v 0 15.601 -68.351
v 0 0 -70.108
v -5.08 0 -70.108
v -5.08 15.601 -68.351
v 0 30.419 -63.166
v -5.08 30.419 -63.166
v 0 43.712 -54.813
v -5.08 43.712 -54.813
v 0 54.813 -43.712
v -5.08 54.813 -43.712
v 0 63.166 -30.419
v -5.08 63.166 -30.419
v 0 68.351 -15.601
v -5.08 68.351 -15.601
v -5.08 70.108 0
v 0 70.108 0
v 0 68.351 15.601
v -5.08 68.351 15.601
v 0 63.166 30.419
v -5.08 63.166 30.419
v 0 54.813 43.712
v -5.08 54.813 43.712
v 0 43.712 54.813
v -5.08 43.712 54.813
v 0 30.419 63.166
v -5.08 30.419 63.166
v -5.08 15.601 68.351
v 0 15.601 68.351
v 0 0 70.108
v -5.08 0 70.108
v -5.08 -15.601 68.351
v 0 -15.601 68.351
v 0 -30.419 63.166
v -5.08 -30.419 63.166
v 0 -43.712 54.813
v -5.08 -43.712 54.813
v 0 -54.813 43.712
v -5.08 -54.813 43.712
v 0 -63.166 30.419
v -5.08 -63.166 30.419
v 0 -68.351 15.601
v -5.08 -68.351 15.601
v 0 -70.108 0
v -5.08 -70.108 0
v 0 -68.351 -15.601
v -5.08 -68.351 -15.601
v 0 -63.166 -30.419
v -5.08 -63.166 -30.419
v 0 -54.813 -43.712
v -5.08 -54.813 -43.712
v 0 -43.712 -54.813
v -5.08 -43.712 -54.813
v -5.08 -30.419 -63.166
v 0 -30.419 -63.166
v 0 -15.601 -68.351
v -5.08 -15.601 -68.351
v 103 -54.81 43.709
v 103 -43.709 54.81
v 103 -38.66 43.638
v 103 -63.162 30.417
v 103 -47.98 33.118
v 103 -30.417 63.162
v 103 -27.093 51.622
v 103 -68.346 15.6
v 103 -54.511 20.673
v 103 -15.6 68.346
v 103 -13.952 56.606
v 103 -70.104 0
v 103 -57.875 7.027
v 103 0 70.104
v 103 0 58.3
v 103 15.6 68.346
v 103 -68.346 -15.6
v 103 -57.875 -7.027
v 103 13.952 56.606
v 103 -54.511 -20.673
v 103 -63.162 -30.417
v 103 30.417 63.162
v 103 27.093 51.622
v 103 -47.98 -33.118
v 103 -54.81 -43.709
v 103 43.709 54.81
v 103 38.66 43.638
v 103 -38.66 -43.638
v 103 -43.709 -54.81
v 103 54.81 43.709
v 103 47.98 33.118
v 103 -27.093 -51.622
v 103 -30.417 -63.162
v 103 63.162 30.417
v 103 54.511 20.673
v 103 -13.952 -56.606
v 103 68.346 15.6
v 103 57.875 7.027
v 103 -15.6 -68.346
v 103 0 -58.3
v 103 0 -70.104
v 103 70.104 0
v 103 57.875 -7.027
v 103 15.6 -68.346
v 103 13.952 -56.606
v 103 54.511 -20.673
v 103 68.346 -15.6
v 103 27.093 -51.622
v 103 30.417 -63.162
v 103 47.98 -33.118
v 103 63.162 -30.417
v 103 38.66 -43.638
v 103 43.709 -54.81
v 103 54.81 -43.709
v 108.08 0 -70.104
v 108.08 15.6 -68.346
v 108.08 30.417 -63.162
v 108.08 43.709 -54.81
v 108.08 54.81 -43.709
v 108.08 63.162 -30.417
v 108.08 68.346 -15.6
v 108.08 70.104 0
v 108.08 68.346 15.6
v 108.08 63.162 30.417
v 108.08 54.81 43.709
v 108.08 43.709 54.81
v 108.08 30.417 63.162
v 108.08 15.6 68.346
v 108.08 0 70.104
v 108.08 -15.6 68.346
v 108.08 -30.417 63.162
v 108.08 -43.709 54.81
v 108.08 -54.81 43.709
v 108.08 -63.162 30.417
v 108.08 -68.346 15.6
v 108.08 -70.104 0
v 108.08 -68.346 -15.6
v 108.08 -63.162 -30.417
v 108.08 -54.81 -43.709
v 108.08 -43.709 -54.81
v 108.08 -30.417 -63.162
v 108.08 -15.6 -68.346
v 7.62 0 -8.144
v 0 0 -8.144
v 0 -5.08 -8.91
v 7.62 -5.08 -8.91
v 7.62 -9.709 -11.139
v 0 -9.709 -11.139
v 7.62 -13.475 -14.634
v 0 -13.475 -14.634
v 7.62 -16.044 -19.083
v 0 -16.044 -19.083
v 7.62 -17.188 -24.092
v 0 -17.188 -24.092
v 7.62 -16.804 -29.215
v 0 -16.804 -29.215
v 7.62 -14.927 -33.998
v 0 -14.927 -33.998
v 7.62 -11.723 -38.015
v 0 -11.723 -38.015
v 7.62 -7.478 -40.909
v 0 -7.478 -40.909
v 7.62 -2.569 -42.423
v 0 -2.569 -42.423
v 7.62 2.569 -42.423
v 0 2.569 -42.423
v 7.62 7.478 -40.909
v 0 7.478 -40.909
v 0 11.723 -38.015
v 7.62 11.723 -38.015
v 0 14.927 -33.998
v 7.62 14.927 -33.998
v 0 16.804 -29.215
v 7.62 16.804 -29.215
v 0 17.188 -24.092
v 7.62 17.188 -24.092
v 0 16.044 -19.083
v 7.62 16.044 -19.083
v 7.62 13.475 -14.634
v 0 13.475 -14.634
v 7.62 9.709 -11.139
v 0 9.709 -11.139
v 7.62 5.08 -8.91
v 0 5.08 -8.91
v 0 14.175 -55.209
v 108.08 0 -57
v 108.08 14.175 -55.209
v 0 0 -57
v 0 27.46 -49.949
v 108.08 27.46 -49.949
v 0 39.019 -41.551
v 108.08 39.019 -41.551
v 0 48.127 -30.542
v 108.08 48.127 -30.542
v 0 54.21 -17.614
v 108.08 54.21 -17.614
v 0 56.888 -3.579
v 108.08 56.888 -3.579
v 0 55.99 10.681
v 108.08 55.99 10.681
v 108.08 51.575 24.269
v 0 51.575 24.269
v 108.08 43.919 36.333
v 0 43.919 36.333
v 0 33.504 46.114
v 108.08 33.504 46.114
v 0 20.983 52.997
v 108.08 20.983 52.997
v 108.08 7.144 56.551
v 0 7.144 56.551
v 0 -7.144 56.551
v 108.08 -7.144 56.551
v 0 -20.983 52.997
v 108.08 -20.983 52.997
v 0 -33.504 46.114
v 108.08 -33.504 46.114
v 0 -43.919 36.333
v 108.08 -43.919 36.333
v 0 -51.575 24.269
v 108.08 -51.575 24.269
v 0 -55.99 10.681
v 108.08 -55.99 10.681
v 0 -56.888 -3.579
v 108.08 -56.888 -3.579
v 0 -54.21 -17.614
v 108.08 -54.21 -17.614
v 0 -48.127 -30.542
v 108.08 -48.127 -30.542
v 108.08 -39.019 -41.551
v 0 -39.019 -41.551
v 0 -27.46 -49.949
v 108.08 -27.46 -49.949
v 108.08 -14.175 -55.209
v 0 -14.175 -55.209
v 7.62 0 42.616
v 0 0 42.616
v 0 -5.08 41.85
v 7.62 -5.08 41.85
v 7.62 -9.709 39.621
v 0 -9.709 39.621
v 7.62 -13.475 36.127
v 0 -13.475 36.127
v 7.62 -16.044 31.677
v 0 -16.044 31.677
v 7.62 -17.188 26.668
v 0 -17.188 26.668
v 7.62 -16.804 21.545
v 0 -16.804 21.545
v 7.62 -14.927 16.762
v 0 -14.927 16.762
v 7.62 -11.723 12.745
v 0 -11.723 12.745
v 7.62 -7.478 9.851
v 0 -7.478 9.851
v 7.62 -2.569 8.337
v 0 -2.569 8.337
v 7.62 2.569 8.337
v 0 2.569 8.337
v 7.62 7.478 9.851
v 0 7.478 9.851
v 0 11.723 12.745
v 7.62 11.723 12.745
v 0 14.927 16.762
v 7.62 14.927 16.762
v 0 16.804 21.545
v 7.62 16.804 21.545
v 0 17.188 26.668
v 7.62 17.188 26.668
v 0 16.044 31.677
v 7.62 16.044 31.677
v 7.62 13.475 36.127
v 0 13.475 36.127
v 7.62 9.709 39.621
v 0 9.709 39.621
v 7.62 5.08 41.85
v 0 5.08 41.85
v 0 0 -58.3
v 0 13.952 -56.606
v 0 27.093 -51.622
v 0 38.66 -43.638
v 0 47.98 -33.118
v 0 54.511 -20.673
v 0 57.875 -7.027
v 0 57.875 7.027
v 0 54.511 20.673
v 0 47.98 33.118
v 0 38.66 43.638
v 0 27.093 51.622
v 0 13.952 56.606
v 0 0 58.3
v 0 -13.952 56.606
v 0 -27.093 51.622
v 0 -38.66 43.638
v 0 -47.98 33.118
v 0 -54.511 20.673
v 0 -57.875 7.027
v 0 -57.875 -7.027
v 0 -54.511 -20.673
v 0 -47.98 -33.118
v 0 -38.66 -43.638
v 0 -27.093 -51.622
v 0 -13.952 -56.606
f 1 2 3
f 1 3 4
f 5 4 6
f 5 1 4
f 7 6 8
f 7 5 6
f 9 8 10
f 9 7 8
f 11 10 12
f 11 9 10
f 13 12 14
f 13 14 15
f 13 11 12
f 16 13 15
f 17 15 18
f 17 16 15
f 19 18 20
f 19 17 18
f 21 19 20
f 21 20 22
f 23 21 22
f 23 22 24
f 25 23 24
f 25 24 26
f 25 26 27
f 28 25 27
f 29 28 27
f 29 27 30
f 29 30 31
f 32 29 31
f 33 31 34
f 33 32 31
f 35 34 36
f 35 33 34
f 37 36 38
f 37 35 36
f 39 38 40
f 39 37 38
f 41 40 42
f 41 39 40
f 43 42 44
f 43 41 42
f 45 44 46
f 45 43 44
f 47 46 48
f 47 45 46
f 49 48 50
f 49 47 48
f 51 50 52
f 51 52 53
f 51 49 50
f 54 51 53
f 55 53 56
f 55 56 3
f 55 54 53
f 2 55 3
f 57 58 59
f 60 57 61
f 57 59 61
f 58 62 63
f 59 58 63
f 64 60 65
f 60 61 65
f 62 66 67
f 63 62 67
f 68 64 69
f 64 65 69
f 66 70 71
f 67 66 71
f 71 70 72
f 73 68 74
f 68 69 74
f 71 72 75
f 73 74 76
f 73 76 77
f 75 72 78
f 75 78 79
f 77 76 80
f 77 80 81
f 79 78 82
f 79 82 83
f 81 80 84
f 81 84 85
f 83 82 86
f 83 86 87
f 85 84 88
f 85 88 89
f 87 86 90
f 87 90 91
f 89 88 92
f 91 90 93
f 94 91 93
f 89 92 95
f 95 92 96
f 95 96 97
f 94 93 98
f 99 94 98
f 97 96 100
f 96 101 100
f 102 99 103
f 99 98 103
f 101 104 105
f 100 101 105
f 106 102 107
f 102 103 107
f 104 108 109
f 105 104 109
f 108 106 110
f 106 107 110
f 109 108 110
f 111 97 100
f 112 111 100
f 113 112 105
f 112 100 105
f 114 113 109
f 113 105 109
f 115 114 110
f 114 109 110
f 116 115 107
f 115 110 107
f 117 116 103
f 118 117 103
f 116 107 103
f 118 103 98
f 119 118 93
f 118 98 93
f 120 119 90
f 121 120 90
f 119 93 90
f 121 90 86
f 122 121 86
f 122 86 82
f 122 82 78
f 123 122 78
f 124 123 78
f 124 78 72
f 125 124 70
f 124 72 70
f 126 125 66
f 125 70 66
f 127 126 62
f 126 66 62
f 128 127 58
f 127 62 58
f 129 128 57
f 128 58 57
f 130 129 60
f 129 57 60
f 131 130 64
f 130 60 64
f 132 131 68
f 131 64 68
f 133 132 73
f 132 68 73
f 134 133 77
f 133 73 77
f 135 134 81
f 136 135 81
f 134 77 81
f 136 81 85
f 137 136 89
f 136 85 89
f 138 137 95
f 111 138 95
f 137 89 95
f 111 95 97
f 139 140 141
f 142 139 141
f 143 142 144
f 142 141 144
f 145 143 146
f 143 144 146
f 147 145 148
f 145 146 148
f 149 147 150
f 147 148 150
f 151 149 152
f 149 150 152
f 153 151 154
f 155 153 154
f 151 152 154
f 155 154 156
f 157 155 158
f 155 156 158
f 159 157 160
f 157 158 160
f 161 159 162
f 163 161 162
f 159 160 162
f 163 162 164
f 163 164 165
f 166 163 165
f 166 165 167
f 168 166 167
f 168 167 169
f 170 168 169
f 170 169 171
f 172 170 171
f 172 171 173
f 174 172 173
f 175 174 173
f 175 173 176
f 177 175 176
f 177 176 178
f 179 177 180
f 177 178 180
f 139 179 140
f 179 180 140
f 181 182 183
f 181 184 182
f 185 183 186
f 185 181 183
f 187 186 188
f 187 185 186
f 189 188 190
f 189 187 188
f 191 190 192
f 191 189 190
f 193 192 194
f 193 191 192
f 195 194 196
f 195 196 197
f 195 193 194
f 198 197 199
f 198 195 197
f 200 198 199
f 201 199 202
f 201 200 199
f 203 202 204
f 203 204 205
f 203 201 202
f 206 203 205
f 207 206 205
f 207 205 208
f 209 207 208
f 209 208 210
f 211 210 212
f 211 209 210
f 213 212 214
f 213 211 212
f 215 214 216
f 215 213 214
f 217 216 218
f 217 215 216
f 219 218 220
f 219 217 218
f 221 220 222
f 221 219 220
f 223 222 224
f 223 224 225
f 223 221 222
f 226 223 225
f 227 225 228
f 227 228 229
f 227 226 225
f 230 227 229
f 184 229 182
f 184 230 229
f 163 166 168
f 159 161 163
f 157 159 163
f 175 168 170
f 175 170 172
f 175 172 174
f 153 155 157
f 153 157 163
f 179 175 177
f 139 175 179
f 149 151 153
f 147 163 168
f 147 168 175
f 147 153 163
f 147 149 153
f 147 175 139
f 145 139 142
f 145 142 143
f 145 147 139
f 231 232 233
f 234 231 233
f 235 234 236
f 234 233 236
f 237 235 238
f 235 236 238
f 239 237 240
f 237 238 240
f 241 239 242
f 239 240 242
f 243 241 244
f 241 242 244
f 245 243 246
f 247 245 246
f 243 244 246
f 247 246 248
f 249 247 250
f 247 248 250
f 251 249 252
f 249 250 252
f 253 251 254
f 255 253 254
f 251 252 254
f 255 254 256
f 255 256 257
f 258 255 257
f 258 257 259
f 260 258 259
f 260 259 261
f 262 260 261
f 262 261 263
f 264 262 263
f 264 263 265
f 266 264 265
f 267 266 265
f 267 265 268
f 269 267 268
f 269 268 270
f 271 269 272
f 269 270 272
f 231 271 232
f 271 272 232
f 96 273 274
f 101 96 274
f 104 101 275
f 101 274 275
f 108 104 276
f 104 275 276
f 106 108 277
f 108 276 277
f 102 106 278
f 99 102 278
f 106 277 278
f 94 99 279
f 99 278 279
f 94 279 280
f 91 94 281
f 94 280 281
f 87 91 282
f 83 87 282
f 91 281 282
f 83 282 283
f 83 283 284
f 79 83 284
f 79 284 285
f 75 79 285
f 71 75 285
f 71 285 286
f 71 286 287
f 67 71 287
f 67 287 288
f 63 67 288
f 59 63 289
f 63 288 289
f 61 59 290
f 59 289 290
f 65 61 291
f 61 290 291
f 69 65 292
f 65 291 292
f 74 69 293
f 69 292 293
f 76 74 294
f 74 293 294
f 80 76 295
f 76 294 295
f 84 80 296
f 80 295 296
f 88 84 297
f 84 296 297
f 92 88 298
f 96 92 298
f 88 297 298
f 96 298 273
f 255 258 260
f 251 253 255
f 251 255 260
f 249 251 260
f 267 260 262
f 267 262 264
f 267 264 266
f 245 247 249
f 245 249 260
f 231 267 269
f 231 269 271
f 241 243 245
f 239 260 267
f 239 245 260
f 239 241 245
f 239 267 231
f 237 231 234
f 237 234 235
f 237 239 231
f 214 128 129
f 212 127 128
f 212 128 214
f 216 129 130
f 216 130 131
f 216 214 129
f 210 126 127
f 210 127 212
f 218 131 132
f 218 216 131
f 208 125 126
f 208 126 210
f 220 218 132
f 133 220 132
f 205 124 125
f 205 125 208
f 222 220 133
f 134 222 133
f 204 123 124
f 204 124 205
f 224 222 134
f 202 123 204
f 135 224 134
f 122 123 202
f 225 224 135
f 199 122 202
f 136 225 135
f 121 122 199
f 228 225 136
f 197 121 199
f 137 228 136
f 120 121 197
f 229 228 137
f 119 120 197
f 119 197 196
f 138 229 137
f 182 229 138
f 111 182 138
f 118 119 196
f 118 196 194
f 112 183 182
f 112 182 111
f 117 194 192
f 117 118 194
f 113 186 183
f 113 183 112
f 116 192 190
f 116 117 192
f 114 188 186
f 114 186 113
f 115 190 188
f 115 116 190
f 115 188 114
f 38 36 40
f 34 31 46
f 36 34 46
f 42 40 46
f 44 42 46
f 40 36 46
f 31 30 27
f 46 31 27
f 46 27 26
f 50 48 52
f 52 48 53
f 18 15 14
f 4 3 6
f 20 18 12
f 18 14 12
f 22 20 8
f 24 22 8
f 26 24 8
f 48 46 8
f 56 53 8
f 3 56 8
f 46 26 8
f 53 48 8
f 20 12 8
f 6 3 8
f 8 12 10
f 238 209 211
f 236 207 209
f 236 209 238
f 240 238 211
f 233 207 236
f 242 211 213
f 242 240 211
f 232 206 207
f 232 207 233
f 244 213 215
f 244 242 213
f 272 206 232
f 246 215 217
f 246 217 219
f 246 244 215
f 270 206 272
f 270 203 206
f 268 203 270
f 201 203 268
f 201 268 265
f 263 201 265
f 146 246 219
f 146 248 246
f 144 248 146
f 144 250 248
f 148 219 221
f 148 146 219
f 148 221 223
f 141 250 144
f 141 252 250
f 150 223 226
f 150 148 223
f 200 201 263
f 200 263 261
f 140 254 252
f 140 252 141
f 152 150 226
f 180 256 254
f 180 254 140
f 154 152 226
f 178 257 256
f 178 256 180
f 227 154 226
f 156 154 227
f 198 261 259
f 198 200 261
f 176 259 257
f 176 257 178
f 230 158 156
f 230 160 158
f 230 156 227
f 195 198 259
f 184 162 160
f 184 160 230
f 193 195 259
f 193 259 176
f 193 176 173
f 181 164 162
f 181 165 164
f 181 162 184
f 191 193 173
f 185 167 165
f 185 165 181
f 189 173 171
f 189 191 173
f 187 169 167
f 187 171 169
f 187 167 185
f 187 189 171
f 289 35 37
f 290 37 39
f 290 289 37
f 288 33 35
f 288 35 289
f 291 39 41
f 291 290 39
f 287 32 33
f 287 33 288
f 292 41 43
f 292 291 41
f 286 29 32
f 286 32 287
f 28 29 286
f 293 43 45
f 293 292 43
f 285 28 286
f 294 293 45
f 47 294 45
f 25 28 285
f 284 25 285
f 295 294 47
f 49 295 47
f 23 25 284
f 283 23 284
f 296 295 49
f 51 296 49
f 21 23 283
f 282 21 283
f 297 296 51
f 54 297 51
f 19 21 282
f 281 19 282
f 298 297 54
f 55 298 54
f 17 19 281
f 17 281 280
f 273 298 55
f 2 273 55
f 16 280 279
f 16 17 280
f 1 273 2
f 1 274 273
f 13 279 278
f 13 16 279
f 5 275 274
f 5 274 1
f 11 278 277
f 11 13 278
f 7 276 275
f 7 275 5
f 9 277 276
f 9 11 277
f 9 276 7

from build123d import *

# Parameters (mm, degrees)
HELIX_CIRCLES_R     = 58.3
HELIX_CIRCLES_R_2   = 57
BOSS_EXTRUDE1_DEPTH = 103
SKETCH50_R          = 70.1085
BOSS_EXTRUDE2_DEPTH = 5.08
SKETCH58_R          = 70.104
SKETCH58_R_2        = 57
BOSS_EXTRUDE6_DEPTH = 5.08
SKETCH59_R          = 17.235790132
BOSS_EXTRUDE7_DEPTH = 7.62


with BuildPart() as part:
    # Helix_Circles → Boss-Extrude1 (new body)
    with BuildSketch(Plane(origin=(0, 0, 0), x_dir=(0, 0, -1), z_dir=(1, 0, 0))):
        Circle(HELIX_CIRCLES_R)
        Circle(HELIX_CIRCLES_R_2, mode=Mode.SUBTRACT)
    extrude(amount=BOSS_EXTRUDE1_DEPTH)

    # Sketch50 → Boss-Extrude2 (add)
    with BuildSketch(Plane(origin=(0, 0, 0), x_dir=(0, 0, -1), z_dir=(1, 0, 0))):
        Circle(SKETCH50_R)
    extrude(amount=-BOSS_EXTRUDE2_DEPTH)

    # Sketch58 → Boss-Extrude6 (add)
    with BuildSketch(Plane(origin=(103, 0, 0), x_dir=(0, 0, -1), z_dir=(1, 0, 0))):
        Circle(SKETCH58_R)
        Circle(SKETCH58_R_2, mode=Mode.SUBTRACT)
    extrude(amount=BOSS_EXTRUDE6_DEPTH)

    # Sketch59 → Boss-Extrude7 (add)
    with BuildSketch(Plane(origin=(0, 0, 0), x_dir=(0, 0, -1), z_dir=(1, 0, 0))):
        with Locations(Location((-25.38017448, 0, 0), (0, 0, 180))):
            Circle(SKETCH59_R)
        with Locations(Location((25.38017448, 0, 0), (0, 0, 180))):
            Circle(SKETCH59_R)
    extrude(amount=BOSS_EXTRUDE7_DEPTH)


solid = part.part
